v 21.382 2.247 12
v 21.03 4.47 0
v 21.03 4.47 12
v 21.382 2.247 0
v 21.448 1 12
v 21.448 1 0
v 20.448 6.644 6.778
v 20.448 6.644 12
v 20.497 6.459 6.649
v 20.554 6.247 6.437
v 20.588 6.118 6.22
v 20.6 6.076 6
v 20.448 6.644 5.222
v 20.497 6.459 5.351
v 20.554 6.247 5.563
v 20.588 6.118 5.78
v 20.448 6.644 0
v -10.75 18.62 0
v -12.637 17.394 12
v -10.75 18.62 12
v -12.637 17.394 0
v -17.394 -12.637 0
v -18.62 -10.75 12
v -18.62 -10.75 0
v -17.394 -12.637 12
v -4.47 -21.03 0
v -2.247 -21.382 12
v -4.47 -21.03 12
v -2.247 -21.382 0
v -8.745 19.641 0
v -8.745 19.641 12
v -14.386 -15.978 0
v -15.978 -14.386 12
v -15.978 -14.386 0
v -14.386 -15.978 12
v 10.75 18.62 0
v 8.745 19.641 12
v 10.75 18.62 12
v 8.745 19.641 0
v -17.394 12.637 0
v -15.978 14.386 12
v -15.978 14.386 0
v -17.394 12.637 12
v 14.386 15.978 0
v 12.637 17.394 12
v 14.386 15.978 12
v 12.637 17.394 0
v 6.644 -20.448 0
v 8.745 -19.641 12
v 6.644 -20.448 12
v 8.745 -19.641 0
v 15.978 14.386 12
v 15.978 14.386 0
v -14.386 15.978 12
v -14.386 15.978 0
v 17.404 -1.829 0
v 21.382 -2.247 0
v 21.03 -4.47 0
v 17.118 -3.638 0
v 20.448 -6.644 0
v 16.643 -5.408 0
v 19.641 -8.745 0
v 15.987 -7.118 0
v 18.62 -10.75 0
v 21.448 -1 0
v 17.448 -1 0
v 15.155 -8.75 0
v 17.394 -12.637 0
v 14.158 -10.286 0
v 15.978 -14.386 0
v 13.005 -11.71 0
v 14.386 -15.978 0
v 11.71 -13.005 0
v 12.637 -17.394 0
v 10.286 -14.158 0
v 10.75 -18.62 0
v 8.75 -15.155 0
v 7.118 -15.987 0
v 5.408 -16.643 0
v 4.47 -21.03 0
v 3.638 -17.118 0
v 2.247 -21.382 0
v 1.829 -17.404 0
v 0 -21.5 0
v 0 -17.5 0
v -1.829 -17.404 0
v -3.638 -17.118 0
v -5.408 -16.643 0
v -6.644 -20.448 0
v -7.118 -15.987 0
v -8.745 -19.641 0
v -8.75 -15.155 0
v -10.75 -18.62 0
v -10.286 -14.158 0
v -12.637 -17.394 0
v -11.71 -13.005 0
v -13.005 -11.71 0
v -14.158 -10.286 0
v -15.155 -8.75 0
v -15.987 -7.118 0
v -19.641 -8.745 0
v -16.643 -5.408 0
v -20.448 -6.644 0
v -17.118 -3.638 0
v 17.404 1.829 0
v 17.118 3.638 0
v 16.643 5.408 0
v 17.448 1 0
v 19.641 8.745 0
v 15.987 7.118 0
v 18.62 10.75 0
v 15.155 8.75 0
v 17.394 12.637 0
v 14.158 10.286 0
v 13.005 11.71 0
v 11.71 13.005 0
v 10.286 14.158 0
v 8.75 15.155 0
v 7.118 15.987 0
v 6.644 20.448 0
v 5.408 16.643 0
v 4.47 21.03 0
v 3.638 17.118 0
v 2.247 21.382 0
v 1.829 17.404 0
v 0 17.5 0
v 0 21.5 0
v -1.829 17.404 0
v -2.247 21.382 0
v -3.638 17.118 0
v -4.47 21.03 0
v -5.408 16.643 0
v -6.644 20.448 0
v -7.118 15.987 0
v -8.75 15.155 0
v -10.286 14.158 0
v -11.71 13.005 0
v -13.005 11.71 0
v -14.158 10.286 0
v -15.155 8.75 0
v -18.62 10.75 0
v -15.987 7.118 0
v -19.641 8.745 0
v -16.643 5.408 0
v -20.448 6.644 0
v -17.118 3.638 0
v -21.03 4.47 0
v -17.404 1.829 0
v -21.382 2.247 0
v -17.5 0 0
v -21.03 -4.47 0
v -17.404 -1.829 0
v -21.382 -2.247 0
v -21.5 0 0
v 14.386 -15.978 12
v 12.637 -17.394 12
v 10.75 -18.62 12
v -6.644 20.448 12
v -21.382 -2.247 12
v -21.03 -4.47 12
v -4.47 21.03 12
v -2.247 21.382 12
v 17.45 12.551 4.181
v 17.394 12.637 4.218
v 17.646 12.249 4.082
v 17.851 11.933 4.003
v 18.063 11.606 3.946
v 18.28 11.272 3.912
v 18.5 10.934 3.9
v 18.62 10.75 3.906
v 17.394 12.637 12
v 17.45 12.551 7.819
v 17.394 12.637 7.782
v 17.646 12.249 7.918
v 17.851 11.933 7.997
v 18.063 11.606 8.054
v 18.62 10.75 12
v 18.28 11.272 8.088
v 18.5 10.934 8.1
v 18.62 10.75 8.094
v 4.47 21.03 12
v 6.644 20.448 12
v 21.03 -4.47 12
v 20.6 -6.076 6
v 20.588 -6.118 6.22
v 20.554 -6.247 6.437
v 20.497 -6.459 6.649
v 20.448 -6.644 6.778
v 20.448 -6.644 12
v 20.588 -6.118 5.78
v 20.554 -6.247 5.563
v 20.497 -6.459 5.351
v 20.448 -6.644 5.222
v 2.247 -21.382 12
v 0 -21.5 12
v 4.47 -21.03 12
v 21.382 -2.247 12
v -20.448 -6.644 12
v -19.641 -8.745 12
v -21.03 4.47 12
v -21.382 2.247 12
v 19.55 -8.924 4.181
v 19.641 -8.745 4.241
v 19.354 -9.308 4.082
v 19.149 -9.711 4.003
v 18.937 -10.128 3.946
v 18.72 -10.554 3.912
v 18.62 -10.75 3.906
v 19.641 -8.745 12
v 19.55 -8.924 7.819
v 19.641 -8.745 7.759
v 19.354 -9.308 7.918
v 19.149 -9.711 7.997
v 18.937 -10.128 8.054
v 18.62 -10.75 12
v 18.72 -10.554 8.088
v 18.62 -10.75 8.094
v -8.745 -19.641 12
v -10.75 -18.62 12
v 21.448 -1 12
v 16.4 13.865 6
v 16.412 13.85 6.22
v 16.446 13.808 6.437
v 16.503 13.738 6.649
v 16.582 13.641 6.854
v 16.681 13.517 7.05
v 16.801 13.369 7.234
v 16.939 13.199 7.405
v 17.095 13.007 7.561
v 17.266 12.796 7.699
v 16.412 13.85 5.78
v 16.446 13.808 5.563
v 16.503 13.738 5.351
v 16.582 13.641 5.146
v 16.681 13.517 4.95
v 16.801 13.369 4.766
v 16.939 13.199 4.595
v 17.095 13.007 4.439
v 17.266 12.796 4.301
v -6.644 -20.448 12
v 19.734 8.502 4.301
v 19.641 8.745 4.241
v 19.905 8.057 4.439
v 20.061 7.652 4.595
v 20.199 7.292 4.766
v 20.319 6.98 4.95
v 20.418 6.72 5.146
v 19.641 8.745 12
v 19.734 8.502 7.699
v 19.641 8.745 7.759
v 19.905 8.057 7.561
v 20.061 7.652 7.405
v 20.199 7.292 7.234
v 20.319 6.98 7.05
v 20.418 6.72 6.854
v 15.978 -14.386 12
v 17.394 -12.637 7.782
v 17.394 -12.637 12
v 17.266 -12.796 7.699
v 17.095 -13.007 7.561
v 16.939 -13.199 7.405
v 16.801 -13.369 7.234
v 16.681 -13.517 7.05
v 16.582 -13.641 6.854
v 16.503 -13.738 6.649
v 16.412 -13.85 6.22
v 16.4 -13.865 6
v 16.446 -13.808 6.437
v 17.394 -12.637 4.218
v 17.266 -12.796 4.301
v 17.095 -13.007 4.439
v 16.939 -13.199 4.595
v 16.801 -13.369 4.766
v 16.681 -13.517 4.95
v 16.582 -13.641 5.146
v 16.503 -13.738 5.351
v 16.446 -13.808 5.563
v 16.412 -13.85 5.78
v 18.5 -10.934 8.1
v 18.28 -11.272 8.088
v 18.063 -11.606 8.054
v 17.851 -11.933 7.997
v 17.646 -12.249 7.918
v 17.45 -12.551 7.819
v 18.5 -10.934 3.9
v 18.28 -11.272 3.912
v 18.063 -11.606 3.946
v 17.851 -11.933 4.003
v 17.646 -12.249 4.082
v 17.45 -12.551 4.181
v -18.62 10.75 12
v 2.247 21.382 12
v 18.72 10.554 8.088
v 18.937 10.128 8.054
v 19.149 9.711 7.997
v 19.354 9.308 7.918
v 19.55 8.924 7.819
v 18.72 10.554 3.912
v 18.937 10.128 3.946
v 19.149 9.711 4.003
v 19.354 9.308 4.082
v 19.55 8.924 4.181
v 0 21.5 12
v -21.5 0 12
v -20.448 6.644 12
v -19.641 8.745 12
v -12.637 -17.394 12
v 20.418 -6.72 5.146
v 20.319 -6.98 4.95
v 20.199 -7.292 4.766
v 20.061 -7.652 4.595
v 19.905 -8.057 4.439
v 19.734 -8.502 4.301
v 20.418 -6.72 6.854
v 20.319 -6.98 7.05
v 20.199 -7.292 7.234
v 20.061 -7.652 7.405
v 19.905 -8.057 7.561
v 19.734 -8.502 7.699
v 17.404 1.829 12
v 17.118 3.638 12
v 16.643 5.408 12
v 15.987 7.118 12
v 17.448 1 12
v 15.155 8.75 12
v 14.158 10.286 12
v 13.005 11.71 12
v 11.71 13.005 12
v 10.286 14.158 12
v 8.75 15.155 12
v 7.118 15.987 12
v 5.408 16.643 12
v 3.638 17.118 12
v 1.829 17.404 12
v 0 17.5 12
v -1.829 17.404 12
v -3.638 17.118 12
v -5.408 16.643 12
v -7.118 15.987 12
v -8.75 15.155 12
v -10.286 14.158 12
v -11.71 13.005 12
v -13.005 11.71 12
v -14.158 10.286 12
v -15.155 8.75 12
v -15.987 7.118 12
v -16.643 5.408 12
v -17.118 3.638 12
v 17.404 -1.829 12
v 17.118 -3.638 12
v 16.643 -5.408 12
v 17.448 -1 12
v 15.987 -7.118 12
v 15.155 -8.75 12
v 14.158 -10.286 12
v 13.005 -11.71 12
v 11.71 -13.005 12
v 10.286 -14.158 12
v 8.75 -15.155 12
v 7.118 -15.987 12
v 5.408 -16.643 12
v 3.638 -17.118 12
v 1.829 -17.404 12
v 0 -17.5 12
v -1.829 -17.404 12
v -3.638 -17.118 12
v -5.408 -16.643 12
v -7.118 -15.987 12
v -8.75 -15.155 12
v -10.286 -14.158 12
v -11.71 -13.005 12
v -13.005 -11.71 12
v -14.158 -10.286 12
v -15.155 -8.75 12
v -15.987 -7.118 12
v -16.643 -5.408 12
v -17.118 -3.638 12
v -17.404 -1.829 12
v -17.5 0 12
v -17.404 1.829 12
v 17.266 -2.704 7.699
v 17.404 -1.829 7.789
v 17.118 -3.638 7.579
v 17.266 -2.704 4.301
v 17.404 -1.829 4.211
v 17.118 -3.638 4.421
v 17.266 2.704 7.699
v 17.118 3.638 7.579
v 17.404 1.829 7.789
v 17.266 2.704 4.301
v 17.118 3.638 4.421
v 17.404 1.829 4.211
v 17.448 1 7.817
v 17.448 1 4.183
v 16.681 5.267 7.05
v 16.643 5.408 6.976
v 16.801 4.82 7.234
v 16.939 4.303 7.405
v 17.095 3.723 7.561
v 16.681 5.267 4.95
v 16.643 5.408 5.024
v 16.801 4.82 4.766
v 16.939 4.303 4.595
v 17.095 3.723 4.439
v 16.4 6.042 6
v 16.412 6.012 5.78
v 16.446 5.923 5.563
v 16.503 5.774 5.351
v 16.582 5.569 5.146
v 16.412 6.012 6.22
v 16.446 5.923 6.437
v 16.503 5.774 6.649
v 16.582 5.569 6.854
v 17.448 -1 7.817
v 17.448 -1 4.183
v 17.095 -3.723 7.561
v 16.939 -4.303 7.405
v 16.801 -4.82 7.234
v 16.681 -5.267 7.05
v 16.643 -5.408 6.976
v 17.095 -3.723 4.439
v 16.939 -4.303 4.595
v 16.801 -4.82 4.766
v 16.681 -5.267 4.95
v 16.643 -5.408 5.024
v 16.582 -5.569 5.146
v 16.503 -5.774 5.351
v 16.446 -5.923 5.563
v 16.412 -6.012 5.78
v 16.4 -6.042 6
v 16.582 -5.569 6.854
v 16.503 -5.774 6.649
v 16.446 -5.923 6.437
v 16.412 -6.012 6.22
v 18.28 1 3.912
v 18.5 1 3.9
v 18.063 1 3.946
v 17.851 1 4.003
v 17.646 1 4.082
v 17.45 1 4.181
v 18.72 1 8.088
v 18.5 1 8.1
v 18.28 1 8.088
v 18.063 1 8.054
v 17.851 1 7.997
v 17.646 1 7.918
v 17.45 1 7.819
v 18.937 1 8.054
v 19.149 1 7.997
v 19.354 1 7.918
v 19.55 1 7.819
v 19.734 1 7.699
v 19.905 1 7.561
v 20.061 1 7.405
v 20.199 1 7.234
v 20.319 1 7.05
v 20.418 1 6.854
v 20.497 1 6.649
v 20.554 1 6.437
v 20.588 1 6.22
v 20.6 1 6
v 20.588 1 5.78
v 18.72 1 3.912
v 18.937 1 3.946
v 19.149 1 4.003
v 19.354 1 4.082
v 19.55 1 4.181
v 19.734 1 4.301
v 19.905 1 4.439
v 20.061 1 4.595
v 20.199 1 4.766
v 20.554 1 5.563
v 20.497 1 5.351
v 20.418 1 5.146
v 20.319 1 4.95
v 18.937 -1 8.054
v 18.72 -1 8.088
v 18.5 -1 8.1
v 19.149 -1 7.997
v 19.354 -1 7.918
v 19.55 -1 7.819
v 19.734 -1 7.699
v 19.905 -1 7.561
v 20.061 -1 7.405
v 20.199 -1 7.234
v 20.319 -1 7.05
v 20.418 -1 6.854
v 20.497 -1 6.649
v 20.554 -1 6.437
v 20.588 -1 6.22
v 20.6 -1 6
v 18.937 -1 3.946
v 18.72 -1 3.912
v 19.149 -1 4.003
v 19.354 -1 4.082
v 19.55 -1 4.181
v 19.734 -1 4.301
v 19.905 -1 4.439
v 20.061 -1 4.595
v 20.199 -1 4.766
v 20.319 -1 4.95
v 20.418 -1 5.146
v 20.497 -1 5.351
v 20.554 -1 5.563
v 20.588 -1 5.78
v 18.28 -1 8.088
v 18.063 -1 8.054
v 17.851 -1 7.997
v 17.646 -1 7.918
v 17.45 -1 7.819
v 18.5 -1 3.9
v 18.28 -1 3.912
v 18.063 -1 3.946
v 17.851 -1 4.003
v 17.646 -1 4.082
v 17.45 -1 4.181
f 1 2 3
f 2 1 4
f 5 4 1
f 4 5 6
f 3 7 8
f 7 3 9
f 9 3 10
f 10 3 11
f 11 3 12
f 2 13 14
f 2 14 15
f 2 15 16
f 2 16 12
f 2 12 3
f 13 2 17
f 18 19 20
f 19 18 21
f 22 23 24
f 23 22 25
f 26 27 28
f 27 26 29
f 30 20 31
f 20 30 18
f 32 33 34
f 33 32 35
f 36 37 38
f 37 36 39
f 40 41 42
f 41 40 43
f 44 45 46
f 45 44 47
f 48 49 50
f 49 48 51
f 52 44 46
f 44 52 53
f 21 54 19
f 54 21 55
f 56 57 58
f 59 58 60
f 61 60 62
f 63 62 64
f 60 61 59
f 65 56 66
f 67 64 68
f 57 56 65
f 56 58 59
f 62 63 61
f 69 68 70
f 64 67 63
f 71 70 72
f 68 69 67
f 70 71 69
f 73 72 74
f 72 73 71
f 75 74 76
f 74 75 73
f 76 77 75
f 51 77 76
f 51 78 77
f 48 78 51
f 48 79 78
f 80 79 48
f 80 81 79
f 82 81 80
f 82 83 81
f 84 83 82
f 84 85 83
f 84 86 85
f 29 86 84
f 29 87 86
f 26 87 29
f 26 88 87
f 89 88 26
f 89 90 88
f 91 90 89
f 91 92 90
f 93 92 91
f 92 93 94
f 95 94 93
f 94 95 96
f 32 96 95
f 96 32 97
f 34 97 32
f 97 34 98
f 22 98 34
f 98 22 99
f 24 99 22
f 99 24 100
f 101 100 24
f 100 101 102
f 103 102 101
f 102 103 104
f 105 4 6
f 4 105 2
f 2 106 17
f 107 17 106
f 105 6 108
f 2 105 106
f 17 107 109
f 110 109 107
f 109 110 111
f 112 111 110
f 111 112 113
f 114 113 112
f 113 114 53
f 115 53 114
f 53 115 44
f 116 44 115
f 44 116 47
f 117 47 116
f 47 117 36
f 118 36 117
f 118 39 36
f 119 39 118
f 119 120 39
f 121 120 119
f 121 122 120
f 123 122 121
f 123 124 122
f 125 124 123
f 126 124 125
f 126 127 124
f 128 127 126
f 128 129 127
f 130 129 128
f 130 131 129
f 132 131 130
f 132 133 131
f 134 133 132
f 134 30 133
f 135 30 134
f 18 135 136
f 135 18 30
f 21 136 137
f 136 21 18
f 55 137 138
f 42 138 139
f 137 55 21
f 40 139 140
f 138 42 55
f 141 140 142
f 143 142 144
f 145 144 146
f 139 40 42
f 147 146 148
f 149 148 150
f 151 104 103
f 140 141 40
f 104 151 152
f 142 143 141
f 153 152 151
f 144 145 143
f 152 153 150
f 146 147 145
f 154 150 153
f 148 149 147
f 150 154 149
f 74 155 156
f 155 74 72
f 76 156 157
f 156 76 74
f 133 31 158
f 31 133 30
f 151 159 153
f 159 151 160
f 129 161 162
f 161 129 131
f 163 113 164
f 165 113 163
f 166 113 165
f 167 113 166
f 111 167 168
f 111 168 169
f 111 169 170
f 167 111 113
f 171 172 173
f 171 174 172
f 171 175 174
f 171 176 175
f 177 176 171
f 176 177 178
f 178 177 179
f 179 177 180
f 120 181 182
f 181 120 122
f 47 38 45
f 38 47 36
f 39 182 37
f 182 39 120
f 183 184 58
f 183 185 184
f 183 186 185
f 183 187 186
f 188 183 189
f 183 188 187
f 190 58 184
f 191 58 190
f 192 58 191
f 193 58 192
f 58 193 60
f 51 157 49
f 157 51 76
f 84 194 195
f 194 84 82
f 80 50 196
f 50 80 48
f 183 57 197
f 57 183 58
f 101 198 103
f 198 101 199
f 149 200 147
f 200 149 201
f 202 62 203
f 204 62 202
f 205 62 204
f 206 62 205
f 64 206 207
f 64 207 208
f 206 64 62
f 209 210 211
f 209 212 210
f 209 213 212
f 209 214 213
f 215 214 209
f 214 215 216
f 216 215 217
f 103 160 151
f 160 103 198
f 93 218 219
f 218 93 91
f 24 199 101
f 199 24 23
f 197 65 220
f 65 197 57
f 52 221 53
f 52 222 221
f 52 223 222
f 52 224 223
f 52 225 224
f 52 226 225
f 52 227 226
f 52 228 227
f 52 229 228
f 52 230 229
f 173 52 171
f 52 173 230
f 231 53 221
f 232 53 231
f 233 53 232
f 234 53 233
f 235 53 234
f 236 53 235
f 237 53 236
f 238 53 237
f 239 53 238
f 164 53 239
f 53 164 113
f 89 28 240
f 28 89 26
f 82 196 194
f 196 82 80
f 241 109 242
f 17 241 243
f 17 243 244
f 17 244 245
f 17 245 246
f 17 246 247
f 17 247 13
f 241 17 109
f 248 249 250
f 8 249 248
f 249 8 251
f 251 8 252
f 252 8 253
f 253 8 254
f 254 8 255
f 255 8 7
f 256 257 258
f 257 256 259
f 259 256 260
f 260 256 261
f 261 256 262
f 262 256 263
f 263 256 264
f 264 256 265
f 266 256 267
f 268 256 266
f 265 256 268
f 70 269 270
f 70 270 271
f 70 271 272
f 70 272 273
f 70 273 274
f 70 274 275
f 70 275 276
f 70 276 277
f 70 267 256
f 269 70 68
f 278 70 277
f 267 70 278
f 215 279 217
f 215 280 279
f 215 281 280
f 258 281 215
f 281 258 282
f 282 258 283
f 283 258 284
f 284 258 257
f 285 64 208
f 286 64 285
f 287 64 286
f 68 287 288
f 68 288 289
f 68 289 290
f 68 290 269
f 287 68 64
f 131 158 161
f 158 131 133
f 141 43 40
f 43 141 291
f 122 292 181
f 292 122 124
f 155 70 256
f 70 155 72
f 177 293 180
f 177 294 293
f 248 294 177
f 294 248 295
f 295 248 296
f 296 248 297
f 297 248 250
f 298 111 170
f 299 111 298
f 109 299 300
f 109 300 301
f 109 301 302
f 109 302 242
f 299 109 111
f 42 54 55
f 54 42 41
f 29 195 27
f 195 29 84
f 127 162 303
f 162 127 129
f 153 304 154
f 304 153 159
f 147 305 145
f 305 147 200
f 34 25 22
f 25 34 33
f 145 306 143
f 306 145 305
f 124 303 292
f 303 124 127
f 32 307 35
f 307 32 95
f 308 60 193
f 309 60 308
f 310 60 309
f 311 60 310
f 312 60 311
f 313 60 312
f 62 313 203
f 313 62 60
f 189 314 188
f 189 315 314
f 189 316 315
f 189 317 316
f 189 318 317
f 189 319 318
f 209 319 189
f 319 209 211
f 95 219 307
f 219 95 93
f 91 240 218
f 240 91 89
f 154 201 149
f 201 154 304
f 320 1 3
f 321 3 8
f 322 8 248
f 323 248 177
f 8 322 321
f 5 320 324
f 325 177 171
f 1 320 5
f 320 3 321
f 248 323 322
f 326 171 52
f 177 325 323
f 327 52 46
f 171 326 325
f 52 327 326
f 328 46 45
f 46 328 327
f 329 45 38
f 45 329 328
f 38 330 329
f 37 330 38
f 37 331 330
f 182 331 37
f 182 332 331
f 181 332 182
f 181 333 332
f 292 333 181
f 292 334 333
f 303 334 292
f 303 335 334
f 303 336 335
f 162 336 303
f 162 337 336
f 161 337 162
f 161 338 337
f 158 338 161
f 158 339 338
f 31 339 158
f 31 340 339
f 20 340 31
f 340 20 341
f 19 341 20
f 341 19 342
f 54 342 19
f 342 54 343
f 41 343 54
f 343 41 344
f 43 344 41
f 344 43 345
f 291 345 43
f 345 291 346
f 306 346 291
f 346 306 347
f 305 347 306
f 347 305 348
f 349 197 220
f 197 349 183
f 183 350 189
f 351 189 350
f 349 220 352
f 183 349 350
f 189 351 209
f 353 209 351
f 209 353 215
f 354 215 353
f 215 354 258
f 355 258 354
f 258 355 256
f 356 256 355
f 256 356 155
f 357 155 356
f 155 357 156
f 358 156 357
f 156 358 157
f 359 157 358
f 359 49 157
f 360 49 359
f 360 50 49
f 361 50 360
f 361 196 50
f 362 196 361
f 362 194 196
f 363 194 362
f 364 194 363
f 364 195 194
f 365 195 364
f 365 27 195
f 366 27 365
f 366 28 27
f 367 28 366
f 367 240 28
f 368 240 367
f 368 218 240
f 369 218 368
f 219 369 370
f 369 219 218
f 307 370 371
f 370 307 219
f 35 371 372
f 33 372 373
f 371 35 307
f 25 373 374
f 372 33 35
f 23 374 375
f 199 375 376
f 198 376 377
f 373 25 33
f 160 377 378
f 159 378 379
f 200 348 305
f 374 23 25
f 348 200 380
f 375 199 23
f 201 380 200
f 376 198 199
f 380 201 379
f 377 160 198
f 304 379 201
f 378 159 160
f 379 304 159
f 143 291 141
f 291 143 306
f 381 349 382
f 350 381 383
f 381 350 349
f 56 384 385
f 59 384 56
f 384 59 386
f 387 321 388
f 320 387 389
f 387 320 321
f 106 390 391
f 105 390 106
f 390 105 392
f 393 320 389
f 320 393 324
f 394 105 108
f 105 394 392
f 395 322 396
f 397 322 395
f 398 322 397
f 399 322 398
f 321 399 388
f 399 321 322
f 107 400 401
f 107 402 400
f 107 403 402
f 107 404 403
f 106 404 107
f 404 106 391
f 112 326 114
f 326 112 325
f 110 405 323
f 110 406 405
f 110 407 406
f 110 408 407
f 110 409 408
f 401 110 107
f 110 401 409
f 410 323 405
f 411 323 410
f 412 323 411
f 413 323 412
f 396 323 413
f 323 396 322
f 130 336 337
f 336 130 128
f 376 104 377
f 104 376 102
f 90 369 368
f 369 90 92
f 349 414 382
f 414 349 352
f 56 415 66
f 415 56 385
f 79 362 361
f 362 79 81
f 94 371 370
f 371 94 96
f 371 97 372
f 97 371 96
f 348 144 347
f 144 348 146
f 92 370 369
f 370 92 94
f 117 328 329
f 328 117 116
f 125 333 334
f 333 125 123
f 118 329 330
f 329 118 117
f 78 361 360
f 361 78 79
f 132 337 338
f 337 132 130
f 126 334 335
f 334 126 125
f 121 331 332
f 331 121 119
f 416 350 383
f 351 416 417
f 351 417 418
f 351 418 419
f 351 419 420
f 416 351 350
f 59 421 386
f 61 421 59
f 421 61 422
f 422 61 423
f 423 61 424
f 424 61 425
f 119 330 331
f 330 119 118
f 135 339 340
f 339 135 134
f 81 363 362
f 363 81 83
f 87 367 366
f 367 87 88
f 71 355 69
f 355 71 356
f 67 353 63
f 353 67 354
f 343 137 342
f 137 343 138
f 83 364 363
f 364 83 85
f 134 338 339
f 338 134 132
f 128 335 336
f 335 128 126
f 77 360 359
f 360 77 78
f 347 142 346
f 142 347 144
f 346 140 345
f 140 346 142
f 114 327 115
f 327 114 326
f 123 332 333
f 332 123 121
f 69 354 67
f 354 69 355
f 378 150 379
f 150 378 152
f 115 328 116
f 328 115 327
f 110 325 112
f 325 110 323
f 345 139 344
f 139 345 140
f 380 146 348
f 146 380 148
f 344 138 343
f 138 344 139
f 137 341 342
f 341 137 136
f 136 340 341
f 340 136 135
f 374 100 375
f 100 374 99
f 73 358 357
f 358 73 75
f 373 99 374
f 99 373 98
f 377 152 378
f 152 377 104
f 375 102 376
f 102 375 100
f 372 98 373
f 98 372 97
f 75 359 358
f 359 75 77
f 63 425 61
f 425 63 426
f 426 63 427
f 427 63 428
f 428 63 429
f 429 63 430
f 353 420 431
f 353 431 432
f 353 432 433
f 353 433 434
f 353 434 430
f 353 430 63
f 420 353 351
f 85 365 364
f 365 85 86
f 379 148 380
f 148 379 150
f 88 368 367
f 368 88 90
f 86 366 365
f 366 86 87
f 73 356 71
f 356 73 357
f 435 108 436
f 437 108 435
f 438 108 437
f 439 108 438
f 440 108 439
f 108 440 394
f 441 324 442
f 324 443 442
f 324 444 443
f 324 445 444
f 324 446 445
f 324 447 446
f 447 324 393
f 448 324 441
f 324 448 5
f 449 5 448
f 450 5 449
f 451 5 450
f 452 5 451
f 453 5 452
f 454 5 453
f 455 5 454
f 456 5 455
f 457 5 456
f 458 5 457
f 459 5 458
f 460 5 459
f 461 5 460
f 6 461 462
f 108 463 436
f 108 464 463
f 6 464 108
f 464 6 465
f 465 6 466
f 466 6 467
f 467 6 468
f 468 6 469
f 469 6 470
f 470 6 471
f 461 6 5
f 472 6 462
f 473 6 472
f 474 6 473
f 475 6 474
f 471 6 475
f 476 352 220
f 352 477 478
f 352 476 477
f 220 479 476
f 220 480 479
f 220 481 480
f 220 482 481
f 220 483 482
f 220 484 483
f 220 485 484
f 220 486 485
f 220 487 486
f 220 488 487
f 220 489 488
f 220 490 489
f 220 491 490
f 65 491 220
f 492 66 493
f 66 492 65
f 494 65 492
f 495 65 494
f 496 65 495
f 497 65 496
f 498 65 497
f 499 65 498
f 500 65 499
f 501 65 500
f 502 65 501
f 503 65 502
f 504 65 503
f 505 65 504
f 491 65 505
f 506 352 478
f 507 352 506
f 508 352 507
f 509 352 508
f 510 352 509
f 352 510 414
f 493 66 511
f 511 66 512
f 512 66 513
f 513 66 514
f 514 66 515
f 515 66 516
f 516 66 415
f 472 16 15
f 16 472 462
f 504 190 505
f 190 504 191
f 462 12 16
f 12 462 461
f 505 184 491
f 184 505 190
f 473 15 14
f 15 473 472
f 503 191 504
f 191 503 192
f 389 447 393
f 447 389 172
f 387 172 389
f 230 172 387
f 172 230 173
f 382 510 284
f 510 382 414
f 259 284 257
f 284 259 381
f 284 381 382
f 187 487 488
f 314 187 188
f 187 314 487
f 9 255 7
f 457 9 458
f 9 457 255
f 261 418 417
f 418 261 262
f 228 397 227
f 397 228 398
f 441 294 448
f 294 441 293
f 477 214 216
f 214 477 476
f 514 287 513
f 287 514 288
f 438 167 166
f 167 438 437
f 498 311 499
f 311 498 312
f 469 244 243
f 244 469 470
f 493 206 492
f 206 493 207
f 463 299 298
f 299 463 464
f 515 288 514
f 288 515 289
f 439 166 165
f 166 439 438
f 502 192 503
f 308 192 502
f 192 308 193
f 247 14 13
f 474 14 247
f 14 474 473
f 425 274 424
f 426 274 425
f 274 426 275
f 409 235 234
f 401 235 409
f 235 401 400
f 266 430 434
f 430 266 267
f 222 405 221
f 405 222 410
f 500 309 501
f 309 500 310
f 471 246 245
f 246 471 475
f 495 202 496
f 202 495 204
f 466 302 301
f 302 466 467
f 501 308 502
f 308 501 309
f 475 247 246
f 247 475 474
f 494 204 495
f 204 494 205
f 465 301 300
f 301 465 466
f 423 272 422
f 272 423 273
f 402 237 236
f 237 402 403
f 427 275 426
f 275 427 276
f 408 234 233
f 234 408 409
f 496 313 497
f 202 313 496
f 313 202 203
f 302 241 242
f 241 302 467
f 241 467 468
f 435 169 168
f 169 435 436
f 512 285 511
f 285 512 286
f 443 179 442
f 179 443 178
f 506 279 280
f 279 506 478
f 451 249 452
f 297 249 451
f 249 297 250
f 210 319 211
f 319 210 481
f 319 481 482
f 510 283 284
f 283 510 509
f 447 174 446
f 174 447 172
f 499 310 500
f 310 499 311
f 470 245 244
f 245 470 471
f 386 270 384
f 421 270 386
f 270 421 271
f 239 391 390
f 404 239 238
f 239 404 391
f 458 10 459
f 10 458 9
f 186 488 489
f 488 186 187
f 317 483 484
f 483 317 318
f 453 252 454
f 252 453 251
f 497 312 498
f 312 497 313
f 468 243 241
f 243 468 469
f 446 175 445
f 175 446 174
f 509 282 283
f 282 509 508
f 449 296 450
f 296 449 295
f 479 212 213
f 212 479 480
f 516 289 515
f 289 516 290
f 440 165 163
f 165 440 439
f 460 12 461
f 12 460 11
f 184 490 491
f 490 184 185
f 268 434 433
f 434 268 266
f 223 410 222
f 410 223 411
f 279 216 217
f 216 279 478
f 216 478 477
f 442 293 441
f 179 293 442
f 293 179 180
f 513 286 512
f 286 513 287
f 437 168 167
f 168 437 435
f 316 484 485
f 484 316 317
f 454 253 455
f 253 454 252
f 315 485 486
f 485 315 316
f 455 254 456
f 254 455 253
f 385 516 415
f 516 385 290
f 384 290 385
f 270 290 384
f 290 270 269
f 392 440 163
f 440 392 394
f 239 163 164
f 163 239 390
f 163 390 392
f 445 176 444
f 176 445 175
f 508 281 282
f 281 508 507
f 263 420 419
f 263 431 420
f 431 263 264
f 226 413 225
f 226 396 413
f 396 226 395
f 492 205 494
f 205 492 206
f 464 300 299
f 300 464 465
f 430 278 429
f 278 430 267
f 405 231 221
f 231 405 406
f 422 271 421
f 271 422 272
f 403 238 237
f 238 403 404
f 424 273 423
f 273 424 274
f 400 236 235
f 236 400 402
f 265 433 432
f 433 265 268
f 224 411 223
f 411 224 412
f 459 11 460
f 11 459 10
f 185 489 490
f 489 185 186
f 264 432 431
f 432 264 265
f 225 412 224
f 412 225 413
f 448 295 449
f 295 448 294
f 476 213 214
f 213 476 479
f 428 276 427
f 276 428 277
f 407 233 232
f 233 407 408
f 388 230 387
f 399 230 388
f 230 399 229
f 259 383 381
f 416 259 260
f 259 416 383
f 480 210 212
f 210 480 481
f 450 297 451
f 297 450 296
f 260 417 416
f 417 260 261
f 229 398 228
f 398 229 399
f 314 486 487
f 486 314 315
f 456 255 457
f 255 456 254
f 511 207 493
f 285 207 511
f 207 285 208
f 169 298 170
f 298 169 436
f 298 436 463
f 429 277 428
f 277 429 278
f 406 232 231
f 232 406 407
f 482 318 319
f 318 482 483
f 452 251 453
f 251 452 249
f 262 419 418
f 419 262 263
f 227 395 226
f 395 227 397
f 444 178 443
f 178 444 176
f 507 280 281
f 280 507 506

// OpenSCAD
// C-style pipe clamp.
$fn = 60;
eps = 0.02;
pipe_d = 35;
wall = 4;
outer_d = pipe_d + 2 * wall;
width = 12;
slit = 2;
difference() {
    cylinder(d=outer_d,h=width);
    translate([0,0,-eps]) cylinder(d=pipe_d,h=width+2*eps);
    translate([0,-slit/2,-eps]) cube([outer_d/2+eps,slit,width+2*eps]);
    translate([outer_d/2-3,-outer_d/2-eps,width/2]) rotate([-90,0,0]) cylinder(d=4.2,h=outer_d+2*eps);
}
